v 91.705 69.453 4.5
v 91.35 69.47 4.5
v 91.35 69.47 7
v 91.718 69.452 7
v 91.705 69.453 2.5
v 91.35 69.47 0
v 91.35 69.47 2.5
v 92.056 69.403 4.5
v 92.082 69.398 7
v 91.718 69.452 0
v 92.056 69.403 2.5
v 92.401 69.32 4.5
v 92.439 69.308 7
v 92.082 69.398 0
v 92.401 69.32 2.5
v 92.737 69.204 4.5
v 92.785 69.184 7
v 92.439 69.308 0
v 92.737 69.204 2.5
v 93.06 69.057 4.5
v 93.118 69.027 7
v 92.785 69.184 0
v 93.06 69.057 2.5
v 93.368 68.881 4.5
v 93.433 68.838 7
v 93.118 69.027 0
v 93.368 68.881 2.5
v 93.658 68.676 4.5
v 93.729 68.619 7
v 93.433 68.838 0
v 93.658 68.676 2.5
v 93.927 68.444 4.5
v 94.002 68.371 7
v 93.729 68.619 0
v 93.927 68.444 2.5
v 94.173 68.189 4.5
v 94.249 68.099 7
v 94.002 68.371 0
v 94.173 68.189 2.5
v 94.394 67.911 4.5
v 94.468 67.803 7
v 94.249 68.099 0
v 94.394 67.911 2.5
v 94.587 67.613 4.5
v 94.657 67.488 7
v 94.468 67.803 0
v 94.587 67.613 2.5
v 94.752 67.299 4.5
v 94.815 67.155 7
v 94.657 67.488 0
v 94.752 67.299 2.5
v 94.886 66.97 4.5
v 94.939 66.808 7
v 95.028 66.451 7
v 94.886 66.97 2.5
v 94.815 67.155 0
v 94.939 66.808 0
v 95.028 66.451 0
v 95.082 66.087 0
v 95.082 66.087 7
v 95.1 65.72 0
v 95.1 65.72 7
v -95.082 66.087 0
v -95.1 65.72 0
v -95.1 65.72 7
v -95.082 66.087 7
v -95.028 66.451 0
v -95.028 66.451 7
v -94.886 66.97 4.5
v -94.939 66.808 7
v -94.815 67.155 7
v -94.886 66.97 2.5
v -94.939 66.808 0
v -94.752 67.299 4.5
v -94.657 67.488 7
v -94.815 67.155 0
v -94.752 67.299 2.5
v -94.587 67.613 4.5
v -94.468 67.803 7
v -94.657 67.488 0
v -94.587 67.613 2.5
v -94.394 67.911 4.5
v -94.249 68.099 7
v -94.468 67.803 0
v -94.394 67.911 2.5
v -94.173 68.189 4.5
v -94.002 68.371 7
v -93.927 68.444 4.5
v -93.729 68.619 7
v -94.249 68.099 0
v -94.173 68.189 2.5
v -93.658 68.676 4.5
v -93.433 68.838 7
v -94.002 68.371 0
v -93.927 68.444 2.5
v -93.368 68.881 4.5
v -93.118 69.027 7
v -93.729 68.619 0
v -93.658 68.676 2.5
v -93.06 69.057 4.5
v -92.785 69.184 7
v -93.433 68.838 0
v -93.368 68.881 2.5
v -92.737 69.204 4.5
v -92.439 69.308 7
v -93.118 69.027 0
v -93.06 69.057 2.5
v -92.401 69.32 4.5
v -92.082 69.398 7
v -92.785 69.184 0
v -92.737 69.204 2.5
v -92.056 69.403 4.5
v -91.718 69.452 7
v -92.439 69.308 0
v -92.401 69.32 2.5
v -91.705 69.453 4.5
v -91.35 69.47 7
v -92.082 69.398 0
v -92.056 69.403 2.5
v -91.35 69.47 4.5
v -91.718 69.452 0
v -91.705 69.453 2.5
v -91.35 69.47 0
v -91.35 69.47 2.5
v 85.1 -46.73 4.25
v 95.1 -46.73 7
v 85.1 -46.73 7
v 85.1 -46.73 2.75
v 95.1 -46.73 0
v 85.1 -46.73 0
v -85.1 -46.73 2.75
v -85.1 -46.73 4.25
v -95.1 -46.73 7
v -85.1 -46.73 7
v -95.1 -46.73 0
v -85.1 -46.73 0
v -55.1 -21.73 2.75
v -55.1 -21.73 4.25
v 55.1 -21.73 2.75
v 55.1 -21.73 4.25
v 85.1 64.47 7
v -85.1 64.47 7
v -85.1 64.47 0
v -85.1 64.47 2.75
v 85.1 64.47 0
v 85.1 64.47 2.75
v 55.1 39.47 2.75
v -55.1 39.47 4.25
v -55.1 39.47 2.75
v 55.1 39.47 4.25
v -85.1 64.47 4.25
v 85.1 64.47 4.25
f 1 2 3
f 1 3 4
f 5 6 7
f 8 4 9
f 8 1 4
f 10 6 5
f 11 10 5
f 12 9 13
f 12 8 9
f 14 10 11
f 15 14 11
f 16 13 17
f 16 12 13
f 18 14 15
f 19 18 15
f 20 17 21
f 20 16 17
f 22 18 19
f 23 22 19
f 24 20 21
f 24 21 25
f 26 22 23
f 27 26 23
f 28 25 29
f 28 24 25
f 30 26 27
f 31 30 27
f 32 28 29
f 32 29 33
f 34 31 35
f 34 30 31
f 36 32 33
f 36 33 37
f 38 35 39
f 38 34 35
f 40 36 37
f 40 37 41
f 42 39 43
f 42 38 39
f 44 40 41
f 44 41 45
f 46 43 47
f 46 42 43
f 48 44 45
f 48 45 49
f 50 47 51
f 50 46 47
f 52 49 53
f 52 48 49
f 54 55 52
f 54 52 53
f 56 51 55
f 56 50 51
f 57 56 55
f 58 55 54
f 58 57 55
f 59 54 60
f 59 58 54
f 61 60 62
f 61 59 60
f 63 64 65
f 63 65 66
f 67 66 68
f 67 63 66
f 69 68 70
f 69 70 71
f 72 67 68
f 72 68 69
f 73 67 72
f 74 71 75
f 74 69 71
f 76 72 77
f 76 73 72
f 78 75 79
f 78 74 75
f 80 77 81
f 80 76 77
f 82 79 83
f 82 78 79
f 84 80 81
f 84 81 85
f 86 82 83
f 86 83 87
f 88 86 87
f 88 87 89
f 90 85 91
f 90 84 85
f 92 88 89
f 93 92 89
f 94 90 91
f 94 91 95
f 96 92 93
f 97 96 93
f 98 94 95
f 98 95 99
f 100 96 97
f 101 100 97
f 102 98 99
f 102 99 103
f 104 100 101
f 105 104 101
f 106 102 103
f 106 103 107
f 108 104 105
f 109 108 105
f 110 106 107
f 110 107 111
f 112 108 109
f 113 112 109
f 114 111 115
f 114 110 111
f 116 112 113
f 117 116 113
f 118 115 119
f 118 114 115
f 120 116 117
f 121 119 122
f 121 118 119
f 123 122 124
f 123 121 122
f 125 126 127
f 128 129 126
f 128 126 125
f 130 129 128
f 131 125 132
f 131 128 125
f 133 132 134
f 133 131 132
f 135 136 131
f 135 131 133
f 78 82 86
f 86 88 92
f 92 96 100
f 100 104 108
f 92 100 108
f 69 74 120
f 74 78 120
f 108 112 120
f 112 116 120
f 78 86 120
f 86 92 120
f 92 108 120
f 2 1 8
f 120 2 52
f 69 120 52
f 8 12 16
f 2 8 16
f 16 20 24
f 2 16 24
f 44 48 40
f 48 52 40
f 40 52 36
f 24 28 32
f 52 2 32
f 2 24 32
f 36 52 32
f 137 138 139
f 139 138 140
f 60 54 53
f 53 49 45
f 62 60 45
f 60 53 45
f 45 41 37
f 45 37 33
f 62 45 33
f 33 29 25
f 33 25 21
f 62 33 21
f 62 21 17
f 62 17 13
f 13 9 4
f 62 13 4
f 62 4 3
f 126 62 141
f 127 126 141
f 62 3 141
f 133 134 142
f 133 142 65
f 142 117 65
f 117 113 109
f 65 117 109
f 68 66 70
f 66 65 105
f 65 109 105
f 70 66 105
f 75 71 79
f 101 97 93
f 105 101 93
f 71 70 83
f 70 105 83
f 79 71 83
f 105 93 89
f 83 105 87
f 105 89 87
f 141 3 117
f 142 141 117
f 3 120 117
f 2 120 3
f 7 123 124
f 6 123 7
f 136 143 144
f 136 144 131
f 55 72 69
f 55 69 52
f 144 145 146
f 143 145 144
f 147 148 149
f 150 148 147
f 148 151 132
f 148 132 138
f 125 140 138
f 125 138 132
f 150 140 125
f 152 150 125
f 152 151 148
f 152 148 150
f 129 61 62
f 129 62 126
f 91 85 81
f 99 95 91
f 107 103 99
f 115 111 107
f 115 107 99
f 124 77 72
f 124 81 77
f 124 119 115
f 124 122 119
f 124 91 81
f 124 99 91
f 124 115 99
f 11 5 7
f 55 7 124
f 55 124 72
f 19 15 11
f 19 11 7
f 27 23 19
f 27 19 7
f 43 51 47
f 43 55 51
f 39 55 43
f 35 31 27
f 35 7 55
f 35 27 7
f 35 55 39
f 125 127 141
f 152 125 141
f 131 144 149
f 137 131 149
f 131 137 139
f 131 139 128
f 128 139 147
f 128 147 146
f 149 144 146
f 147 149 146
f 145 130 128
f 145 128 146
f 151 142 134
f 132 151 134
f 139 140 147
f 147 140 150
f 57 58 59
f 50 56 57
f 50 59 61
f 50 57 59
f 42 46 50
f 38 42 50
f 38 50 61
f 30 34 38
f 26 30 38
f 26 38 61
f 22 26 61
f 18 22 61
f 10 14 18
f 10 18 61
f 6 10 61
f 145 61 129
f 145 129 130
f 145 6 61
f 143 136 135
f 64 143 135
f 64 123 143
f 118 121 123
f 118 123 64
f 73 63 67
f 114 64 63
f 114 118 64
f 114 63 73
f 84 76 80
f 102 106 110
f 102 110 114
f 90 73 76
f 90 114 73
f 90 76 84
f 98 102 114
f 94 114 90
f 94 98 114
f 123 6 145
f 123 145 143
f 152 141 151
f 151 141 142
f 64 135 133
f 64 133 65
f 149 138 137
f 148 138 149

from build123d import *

# Parameters (mm, degrees)
EXTRUDE_1_DEPTH     = 7
CUT_EXTRUDE_1_DEPTH = 2.75
CUT_EXTRUDE_2_DEPTH = 2.75
SKETCH_4_W          = 190.2
SKETCH_4_H          = 2
CUT_EXTRUDE_3_DEPTH = 2.5
SKETCH_5_W          = 110.2
SKETCH_5_H          = 61.2
CUT_EXTRUDE_4_DEPTH = 118.847914448


with BuildPart() as part:
    # 草图1 → 凸台-拉伸1 (new body)
    with BuildSketch(Plane.XY):
        with BuildLine():
            Line((-91.35, 69.469838346), (91.35, 69.469838346))
            ThreePointArc((91.35, 69.469838346), (94.001650429, 68.371488775), (95.1, 65.719838346))
            Line((95.1, 65.719838346), (95.1, -46.730161654))
            Line((95.1, -46.730161654), (-95.1, -46.730161654))
            Line((-95.1, -46.730161654), (-95.1, 65.719838346))
            ThreePointArc((-95.1, 65.719838346), (-94.001650429, 68.371488775), (-91.35, 69.469838346))
        make_face()
    extrude(amount=EXTRUDE_1_DEPTH)

    # 草图2 → 切除-拉伸1 (cut)
    with BuildSketch(Plane.XY):
        Polygon((-85.1, -46.730161654), (85.1, -46.730161654), (85.1, -36.730161654), (85.1, 59.469838346), (85.1, 64.469838346), (-85.1, 64.469838346), (-85.1, 59.469838346), (-85.1, -36.730161654), align=None)
    extrude(amount=CUT_EXTRUDE_1_DEPTH, mode=Mode.SUBTRACT)

    # 草图3 → 切除-拉伸2 (cut)
    with BuildSketch(Plane.XY.offset(7)):
        Polygon((-85.1, -36.730161654), (-85.1, -46.730161654), (85.1, -46.730161654), (85.1, -36.730161654), (85.1, 59.469838346), (85.1, 64.469838346), (-85.1, 64.469838346), (-85.1, 59.469838346), align=None)
    extrude(amount=-CUT_EXTRUDE_2_DEPTH, mode=Mode.SUBTRACT)

    # 草图4 → 切除-拉伸3 (cut)
    with BuildSketch(Plane(origin=(0, 69.469838346, 0), x_dir=(1, 0, 0), z_dir=(0, 1, 0))):
        with Locations((0, -3.5)):
            Rectangle(SKETCH_4_W, SKETCH_4_H)
    extrude(amount=-CUT_EXTRUDE_3_DEPTH, mode=Mode.SUBTRACT)

    # 草图5 → 切除-拉伸4 (cut, through all)
    with BuildSketch(Plane.XY.offset(4.25)):
        with Locations((0, 8.869838346)):
            Rectangle(SKETCH_5_W, SKETCH_5_H)
    extrude(amount=-CUT_EXTRUDE_4_DEPTH, mode=Mode.SUBTRACT)


solid = part.part
